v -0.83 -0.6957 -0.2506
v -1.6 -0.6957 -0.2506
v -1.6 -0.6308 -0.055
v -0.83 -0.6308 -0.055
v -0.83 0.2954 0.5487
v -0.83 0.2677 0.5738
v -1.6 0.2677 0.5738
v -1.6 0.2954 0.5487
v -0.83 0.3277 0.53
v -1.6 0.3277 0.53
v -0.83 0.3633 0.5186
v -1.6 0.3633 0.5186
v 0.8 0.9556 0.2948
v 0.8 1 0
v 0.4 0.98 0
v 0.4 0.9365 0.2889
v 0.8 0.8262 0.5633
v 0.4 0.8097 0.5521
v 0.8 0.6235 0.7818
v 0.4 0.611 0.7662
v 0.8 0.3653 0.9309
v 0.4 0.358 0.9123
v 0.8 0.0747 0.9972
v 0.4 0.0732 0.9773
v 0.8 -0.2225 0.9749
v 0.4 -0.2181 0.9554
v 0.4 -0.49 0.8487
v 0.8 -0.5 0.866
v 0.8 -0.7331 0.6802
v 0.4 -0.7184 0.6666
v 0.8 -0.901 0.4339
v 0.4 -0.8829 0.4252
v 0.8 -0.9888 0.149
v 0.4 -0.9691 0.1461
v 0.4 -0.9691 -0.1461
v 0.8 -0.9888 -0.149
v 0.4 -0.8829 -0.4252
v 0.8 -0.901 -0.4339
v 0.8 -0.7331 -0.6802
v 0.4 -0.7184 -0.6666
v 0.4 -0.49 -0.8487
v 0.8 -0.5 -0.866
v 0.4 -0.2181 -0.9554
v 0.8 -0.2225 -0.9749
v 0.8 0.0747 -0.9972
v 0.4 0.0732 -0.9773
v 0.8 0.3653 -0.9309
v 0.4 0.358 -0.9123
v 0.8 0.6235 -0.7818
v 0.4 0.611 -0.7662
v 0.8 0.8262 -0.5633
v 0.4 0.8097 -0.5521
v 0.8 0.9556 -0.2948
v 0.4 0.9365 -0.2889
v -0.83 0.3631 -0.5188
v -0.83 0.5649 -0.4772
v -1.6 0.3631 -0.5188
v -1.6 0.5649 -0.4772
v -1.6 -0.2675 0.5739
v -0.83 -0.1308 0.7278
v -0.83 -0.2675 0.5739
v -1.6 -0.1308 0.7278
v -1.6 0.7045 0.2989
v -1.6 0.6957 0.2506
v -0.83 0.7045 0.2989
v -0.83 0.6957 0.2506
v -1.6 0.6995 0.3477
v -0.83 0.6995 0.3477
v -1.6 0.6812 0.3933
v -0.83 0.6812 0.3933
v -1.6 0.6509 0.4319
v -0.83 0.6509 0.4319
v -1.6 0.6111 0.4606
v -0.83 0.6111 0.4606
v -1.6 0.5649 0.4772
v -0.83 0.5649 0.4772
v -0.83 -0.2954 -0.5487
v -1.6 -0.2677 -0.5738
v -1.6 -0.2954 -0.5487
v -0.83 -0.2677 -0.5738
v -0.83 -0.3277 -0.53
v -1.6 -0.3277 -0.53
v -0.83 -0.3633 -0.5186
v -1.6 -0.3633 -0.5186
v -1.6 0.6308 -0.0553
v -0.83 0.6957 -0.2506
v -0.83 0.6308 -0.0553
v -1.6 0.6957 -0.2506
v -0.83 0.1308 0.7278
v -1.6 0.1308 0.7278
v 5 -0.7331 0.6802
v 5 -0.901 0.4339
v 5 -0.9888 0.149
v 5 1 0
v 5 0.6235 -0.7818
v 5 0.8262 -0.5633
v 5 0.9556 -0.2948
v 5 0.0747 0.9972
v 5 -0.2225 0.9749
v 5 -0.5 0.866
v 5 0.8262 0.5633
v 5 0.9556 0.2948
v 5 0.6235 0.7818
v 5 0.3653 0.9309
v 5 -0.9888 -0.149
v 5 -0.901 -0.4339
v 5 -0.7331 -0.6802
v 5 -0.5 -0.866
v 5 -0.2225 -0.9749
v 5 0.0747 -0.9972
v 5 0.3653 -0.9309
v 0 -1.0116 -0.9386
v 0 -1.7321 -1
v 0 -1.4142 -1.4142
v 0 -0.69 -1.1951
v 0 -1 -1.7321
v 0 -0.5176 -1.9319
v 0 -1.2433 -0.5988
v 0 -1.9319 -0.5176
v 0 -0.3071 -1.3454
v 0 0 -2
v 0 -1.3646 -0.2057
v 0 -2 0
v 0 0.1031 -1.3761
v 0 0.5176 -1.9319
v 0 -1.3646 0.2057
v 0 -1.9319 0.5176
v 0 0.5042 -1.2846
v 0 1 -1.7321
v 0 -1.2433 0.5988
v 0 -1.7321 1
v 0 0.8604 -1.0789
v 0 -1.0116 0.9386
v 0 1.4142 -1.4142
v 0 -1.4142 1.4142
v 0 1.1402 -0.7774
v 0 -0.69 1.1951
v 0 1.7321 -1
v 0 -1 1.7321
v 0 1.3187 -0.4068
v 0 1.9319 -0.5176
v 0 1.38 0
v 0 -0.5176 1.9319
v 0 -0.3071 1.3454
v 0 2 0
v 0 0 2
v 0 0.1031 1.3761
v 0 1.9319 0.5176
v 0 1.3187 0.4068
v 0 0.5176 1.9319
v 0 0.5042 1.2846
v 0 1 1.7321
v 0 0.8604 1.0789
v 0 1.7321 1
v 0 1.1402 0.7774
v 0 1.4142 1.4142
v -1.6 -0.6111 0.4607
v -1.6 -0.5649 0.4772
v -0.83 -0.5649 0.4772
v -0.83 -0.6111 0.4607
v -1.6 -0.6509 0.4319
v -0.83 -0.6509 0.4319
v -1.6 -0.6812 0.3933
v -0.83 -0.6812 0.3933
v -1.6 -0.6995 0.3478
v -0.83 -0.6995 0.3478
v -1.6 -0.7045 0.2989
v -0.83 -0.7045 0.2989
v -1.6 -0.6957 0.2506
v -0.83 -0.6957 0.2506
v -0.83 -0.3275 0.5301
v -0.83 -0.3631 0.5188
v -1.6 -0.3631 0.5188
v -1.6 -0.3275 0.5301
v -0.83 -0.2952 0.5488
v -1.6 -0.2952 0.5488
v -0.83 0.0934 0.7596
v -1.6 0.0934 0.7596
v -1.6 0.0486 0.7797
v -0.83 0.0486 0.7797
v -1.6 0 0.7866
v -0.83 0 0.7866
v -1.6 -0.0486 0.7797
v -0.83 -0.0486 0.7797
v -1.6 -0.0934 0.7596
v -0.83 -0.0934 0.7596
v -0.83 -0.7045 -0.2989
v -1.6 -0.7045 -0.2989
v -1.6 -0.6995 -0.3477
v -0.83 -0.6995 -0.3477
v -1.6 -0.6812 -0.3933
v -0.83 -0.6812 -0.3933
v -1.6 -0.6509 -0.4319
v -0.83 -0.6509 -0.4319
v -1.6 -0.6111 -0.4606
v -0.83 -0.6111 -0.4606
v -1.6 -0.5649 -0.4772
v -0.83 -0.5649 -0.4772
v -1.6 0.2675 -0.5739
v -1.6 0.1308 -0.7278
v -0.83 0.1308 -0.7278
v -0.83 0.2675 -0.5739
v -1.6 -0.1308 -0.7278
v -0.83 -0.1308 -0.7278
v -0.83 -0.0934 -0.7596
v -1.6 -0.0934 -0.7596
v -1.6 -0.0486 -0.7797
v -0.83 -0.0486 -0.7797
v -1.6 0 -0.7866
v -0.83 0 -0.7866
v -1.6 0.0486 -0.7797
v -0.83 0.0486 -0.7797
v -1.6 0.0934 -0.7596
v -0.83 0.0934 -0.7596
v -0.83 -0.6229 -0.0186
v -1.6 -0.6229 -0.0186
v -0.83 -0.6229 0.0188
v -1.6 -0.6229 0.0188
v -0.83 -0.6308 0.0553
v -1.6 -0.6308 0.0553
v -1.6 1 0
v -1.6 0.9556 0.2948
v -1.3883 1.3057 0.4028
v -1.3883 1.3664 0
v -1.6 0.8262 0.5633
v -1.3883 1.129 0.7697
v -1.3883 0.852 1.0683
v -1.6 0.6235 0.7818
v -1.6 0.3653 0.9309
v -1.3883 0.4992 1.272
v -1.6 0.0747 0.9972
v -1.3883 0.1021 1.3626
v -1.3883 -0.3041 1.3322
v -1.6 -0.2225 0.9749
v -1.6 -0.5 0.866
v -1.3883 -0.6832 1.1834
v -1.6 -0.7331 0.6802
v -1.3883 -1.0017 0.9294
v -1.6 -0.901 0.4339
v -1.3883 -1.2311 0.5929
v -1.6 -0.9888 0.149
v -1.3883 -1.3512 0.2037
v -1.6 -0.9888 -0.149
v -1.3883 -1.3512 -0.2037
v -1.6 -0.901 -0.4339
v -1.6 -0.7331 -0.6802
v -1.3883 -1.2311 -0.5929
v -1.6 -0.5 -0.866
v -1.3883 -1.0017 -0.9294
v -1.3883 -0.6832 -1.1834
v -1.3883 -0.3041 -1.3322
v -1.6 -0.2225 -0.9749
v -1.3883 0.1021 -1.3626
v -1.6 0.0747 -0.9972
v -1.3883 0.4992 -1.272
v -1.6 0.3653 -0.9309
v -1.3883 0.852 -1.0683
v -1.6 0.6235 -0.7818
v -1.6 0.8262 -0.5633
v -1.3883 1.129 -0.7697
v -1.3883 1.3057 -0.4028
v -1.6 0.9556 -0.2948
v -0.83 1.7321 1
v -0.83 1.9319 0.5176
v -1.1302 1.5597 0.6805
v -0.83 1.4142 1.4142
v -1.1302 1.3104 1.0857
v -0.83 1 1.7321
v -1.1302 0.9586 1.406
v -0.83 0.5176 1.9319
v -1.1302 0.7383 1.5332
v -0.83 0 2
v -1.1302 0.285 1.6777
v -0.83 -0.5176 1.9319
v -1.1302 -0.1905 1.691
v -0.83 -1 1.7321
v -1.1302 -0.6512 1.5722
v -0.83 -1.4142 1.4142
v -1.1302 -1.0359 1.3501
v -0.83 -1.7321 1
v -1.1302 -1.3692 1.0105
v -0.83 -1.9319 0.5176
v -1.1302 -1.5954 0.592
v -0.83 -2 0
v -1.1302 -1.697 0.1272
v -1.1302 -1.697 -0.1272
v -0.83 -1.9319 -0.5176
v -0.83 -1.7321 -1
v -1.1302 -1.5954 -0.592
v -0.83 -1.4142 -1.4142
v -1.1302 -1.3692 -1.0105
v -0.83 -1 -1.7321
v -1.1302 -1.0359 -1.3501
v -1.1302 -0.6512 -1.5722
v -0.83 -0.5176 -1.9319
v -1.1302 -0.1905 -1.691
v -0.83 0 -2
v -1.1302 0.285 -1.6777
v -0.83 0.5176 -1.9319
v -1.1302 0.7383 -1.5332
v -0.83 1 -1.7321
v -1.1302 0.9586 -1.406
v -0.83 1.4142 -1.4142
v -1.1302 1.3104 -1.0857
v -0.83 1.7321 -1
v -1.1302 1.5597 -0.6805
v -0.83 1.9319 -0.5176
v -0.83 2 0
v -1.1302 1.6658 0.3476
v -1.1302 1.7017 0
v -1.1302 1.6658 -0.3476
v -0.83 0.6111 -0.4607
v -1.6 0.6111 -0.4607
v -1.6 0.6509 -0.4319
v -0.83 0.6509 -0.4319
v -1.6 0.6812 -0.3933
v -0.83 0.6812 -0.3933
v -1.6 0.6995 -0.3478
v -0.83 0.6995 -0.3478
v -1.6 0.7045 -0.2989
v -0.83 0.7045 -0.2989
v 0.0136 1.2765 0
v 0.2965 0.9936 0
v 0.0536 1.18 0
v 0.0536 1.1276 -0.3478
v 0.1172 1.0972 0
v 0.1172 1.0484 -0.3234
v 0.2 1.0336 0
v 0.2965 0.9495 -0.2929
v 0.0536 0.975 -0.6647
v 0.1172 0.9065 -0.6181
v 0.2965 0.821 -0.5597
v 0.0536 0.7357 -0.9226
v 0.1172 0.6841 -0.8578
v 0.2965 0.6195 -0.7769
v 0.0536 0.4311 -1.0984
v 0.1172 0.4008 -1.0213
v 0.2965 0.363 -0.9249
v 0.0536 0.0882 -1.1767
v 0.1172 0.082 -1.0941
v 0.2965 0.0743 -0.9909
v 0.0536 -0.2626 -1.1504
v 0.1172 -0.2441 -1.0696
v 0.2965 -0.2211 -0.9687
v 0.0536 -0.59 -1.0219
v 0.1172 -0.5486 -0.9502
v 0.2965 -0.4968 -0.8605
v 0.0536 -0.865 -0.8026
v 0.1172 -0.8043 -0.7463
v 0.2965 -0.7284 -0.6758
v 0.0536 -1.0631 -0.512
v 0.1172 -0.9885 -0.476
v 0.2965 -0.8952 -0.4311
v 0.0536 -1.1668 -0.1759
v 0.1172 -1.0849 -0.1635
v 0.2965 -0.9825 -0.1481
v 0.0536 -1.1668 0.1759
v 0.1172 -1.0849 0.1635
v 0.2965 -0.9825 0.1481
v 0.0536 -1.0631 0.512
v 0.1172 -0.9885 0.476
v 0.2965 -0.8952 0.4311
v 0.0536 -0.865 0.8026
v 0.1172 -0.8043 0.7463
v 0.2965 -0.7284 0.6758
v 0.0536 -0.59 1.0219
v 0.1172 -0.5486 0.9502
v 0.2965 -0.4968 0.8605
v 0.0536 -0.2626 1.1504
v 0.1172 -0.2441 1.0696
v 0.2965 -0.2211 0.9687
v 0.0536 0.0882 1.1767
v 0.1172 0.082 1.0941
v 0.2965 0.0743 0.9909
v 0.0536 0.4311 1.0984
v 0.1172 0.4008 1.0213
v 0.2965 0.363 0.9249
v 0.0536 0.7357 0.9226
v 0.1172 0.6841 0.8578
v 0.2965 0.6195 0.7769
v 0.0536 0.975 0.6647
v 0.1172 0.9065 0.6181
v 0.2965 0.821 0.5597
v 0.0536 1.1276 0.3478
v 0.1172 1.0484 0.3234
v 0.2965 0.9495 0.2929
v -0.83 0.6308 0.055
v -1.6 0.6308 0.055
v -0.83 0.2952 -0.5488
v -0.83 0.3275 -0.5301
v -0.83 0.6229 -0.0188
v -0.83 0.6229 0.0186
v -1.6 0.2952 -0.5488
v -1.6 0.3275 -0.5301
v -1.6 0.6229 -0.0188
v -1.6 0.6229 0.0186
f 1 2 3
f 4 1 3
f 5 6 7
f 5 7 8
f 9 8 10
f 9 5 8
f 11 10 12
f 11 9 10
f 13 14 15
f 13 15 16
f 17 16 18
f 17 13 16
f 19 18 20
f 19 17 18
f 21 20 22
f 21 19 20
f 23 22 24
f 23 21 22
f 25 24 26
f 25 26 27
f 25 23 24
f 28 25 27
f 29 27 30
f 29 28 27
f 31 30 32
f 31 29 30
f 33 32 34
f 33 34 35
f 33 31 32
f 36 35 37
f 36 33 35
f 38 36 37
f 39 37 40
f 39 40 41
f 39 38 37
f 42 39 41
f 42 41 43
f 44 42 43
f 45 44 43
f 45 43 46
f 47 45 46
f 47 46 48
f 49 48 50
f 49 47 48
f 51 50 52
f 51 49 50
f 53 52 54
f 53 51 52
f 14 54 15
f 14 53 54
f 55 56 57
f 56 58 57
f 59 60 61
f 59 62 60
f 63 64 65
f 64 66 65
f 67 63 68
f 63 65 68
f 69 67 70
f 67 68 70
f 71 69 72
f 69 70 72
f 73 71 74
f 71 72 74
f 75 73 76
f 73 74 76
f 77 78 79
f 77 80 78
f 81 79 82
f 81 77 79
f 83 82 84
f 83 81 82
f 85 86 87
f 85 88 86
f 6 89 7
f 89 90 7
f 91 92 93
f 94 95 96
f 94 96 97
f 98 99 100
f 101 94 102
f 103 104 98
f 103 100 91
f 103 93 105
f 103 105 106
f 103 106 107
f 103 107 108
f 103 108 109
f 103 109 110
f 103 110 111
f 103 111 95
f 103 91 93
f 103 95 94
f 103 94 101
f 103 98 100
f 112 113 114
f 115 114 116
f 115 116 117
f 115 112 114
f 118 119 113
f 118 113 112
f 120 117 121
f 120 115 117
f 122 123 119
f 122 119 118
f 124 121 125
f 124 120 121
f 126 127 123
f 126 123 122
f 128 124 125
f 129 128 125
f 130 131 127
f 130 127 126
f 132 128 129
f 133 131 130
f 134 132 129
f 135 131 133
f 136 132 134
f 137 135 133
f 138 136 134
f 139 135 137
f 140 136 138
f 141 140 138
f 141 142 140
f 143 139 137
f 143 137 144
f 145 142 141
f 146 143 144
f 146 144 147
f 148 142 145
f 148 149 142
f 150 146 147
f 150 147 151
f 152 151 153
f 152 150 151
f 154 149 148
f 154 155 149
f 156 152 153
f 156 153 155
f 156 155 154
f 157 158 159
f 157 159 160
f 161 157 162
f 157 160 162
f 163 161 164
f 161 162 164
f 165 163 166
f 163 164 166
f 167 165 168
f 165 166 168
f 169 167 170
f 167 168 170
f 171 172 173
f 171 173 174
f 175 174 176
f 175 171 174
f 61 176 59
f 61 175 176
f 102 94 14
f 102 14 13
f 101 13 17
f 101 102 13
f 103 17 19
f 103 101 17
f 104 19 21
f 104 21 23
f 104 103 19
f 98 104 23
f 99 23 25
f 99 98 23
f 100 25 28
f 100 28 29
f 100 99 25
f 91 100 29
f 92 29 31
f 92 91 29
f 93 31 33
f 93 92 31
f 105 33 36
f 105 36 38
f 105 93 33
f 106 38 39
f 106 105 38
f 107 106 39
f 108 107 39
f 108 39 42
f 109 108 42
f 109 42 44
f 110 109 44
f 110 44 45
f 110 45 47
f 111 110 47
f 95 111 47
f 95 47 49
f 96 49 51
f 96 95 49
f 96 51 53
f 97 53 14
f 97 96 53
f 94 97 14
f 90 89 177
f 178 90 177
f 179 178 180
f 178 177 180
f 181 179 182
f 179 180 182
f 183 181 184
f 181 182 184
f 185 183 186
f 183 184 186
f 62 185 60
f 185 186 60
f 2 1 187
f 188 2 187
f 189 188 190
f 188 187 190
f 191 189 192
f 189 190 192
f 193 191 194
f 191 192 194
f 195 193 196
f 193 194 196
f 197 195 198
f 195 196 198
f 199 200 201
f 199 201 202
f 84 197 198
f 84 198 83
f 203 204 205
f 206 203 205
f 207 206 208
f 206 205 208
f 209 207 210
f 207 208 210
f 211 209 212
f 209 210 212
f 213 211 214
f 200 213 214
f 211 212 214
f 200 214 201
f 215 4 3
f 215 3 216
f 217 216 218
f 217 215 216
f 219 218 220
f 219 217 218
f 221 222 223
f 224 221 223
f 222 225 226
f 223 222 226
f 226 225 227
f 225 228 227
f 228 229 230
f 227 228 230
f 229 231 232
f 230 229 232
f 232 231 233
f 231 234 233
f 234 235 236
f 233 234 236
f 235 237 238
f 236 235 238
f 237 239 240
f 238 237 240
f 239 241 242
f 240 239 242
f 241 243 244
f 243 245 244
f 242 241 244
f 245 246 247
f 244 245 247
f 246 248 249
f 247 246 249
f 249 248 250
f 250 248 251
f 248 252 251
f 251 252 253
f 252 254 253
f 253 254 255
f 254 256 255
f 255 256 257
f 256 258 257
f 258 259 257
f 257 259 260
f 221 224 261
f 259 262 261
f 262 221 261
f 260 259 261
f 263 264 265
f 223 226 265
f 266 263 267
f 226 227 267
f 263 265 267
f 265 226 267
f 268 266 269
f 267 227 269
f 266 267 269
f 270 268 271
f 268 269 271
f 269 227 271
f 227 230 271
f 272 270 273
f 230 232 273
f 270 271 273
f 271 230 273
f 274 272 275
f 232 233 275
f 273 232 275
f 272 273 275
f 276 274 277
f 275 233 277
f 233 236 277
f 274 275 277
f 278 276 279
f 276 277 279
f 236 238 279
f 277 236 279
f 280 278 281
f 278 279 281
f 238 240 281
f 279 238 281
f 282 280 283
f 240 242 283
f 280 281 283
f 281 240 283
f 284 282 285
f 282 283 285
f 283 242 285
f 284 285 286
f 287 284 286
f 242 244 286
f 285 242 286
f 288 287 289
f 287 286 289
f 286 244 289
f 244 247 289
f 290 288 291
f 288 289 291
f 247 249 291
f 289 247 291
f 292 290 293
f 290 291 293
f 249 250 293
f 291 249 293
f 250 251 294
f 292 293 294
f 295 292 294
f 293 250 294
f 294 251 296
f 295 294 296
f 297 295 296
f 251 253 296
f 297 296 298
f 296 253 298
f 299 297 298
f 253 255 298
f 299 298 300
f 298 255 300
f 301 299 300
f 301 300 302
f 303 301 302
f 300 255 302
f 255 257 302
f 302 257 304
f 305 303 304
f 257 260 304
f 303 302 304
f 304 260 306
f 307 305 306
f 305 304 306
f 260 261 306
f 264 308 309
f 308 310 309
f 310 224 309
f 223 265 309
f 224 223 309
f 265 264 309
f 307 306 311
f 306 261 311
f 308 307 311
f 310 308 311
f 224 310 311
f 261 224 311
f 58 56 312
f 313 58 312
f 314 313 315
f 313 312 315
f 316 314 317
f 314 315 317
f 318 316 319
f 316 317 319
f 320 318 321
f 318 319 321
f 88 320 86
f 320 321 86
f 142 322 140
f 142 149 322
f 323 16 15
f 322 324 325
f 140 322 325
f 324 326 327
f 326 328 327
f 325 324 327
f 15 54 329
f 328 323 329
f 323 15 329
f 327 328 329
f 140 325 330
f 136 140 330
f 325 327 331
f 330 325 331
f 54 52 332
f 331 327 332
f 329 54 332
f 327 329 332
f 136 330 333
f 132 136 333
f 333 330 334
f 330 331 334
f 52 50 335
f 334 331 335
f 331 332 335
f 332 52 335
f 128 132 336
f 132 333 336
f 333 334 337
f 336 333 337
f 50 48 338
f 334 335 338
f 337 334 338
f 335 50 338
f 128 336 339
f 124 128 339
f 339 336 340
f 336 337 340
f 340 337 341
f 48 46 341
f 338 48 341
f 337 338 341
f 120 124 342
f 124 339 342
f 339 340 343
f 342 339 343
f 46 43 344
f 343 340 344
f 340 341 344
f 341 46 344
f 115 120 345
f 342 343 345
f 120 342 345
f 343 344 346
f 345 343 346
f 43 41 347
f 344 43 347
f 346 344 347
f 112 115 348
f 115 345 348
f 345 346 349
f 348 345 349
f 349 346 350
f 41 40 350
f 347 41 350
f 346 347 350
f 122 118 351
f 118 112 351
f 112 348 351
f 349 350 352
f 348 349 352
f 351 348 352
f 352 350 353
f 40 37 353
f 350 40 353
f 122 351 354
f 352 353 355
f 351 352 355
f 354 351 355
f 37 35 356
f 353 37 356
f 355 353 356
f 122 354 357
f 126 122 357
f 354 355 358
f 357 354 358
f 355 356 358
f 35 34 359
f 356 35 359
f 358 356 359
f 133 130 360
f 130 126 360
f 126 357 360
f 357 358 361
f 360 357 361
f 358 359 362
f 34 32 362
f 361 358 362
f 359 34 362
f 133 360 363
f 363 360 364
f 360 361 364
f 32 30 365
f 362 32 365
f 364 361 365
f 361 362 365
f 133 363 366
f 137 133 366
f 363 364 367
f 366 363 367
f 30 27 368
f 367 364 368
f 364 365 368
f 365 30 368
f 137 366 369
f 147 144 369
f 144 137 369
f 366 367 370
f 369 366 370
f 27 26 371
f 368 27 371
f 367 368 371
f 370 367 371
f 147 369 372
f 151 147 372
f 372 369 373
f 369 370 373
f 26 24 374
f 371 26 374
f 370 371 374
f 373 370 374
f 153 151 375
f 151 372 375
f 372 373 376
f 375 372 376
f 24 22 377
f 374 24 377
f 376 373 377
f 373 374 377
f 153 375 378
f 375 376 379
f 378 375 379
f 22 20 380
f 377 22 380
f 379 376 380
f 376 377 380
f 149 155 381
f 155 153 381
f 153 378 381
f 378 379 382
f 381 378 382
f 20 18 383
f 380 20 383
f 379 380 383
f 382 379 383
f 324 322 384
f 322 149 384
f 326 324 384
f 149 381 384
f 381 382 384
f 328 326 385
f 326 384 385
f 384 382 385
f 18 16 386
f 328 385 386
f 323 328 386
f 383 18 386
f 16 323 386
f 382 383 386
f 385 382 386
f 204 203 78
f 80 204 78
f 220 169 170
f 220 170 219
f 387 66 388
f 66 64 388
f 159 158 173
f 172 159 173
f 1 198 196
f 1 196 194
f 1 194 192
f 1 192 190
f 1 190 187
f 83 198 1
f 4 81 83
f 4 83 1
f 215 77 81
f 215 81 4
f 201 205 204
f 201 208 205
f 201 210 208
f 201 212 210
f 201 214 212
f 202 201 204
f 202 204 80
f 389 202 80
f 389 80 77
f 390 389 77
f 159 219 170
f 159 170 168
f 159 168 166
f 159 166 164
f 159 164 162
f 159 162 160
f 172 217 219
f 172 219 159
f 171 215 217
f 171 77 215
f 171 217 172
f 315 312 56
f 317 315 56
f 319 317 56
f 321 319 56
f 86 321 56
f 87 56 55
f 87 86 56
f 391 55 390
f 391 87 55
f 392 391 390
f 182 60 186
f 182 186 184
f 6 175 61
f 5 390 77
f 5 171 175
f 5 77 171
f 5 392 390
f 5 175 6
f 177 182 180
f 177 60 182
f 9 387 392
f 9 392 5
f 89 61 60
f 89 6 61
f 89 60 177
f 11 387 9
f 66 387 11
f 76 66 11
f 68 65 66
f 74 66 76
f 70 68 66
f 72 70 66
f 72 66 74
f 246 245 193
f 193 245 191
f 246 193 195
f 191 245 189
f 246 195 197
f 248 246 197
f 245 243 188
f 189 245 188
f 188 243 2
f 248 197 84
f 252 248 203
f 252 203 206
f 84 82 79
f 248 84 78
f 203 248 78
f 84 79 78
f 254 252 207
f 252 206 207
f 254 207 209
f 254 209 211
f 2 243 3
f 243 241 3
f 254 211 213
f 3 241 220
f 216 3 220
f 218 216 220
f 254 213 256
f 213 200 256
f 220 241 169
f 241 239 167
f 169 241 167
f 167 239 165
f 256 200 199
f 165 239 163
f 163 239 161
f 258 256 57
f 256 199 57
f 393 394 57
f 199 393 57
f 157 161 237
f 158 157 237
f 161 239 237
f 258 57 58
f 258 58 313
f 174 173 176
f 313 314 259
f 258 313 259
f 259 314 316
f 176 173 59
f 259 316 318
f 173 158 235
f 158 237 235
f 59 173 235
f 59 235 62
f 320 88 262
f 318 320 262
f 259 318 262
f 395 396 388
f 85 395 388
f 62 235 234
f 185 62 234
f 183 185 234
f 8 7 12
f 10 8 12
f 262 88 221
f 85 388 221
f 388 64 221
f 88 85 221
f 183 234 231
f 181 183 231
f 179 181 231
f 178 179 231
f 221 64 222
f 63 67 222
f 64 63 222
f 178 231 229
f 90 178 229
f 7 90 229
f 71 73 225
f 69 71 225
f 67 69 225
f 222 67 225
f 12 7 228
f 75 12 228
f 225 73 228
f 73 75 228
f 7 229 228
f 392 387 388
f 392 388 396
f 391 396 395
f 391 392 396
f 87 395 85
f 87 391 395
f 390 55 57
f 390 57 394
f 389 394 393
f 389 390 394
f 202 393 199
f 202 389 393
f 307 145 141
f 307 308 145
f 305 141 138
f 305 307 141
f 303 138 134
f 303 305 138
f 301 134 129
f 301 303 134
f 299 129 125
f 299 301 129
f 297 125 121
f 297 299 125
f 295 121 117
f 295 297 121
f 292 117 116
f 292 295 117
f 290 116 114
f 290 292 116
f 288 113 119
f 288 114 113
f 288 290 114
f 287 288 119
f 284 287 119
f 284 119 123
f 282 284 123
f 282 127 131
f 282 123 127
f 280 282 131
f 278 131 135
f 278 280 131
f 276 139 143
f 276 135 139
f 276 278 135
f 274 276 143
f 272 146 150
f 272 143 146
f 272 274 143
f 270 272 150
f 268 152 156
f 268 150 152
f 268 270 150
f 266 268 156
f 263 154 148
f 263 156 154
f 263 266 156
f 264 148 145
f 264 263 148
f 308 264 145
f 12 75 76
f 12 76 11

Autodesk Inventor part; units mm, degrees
ref_plane "YZ Plane" through (0, 0, 0) normal (1, 0, 0) x (0, 1, 0)
ref_plane "XZ Plane" through (0, 0, 0) normal (0, 1, 0) x (-1, 0, 0)
ref_plane "XY Plane" through (0, 0, 0) normal (0, 0, 1) x (1, 0, 0)
sketch "Sketch4" plane through (0, 0, 0) normal (0, 0, 1) x (1, 0, 0)
  line L0 (-1.6, 0) -> (5, 0)
  line L1 (0, 0) -> (-1.6, 0)
  line L2 (0, 2) -> (0, 1.38)
  line L3 (0.4, 0.98) -> (0.4, 0.98)
  line L4 (0.4, 0.98) -> (0.8, 1)
  arc A0 (0, 1.38) -> (0.4, 0.98) centre (0.4, 1.38) ccw
  line L5 (-1.6, 0) -> (-1.6, 1)
  line L6 (0, 2) -> (-0.83, 2)
  arc A1 (-0.83, 2) -> (-1.6, 1) centre (1.2707, -0.414) ccw
  line L7 (0.8, 1) -> (5, 1)
  line L8 (5, 1) -> (5, 0)
  point P0 (0, 0.98)
  dimension "d71" = 0.4
  dimension "d72" = 5
  dimension "d74" = 0.4
  dimension "d75" = 1.96
  dimension "d78" = 2
  dimension "d82" = 3.2
  dimension "d83" = 1.6
  dimension "d84" = 4
  dimension "d104" = 4.2
  dimension "d105" = 2
revolve "Revolution7" add sketch "Sketch4" angle 360 about axis through (-1.6, 0, 0) along (1, 0, 0)
sketch "Sketch5" plane through (-1.6, 0, 0) normal (-1, 0, 0) x (0, 0, 1)
  circle A0 centre (0, 0) radius 0.875 construction
  circle A1 centre (0, 0) radius 0.6125 construction
  line L0 (0, 0) -> (-0.5304, 0.3062)
  line L1 (0, 0) -> (-0.5304, -0.3063)
  line L2 (-1.8008, 0) -> (1.7887, 0)
  line L3 (-0.875, 0) -> (-0.5304, -0.3063)
  line L4 (-0.875, 0) -> (-0.5304, 0.3062)
  point P0 (0, 0)
  dimension "d88" = 1.75
  dimension "d89" = 1.225
  dimension "d90" = 30
  dimension "d91" = 30
extrude "Extrusion1" cut sketch "Sketch5" against normal blind 0.77
pattern_circular "Circular Pattern1" count 6 over 360 about axis through (-10, 0, 0) along (1, 0, 0) of "Extrusion1"
fillet "Fillet1" radius 0.175 12 edges at (-1.215, -0.7578, -0.4375) (-1.215, -0.3063, -0.5304) (-1.215, -0.6125, 0) (-1.215, -0.7578, 0.4375) (-1.215, -0.3062, 0.5304) (-1.215, 0, 0.875) (-1.215, 0.6125, 0) (-1.215, 0.7578, 0.4375) (-1.215, 0.3063, 0.5304) (-1.215, 0.3062, -0.5304) (-1.215, 0, -0.875) (-1.215, 0.7578, -0.4375)
thread "Thread7" size "M2x0.4" class "6g" standard "ISO Metric profile" length 4.2
properties part number "Šroub s válcovou hlavou a šestiramennou drážkou ISO 14583 - M2 x 5 - 4.8" material "Ocel, měkká"
